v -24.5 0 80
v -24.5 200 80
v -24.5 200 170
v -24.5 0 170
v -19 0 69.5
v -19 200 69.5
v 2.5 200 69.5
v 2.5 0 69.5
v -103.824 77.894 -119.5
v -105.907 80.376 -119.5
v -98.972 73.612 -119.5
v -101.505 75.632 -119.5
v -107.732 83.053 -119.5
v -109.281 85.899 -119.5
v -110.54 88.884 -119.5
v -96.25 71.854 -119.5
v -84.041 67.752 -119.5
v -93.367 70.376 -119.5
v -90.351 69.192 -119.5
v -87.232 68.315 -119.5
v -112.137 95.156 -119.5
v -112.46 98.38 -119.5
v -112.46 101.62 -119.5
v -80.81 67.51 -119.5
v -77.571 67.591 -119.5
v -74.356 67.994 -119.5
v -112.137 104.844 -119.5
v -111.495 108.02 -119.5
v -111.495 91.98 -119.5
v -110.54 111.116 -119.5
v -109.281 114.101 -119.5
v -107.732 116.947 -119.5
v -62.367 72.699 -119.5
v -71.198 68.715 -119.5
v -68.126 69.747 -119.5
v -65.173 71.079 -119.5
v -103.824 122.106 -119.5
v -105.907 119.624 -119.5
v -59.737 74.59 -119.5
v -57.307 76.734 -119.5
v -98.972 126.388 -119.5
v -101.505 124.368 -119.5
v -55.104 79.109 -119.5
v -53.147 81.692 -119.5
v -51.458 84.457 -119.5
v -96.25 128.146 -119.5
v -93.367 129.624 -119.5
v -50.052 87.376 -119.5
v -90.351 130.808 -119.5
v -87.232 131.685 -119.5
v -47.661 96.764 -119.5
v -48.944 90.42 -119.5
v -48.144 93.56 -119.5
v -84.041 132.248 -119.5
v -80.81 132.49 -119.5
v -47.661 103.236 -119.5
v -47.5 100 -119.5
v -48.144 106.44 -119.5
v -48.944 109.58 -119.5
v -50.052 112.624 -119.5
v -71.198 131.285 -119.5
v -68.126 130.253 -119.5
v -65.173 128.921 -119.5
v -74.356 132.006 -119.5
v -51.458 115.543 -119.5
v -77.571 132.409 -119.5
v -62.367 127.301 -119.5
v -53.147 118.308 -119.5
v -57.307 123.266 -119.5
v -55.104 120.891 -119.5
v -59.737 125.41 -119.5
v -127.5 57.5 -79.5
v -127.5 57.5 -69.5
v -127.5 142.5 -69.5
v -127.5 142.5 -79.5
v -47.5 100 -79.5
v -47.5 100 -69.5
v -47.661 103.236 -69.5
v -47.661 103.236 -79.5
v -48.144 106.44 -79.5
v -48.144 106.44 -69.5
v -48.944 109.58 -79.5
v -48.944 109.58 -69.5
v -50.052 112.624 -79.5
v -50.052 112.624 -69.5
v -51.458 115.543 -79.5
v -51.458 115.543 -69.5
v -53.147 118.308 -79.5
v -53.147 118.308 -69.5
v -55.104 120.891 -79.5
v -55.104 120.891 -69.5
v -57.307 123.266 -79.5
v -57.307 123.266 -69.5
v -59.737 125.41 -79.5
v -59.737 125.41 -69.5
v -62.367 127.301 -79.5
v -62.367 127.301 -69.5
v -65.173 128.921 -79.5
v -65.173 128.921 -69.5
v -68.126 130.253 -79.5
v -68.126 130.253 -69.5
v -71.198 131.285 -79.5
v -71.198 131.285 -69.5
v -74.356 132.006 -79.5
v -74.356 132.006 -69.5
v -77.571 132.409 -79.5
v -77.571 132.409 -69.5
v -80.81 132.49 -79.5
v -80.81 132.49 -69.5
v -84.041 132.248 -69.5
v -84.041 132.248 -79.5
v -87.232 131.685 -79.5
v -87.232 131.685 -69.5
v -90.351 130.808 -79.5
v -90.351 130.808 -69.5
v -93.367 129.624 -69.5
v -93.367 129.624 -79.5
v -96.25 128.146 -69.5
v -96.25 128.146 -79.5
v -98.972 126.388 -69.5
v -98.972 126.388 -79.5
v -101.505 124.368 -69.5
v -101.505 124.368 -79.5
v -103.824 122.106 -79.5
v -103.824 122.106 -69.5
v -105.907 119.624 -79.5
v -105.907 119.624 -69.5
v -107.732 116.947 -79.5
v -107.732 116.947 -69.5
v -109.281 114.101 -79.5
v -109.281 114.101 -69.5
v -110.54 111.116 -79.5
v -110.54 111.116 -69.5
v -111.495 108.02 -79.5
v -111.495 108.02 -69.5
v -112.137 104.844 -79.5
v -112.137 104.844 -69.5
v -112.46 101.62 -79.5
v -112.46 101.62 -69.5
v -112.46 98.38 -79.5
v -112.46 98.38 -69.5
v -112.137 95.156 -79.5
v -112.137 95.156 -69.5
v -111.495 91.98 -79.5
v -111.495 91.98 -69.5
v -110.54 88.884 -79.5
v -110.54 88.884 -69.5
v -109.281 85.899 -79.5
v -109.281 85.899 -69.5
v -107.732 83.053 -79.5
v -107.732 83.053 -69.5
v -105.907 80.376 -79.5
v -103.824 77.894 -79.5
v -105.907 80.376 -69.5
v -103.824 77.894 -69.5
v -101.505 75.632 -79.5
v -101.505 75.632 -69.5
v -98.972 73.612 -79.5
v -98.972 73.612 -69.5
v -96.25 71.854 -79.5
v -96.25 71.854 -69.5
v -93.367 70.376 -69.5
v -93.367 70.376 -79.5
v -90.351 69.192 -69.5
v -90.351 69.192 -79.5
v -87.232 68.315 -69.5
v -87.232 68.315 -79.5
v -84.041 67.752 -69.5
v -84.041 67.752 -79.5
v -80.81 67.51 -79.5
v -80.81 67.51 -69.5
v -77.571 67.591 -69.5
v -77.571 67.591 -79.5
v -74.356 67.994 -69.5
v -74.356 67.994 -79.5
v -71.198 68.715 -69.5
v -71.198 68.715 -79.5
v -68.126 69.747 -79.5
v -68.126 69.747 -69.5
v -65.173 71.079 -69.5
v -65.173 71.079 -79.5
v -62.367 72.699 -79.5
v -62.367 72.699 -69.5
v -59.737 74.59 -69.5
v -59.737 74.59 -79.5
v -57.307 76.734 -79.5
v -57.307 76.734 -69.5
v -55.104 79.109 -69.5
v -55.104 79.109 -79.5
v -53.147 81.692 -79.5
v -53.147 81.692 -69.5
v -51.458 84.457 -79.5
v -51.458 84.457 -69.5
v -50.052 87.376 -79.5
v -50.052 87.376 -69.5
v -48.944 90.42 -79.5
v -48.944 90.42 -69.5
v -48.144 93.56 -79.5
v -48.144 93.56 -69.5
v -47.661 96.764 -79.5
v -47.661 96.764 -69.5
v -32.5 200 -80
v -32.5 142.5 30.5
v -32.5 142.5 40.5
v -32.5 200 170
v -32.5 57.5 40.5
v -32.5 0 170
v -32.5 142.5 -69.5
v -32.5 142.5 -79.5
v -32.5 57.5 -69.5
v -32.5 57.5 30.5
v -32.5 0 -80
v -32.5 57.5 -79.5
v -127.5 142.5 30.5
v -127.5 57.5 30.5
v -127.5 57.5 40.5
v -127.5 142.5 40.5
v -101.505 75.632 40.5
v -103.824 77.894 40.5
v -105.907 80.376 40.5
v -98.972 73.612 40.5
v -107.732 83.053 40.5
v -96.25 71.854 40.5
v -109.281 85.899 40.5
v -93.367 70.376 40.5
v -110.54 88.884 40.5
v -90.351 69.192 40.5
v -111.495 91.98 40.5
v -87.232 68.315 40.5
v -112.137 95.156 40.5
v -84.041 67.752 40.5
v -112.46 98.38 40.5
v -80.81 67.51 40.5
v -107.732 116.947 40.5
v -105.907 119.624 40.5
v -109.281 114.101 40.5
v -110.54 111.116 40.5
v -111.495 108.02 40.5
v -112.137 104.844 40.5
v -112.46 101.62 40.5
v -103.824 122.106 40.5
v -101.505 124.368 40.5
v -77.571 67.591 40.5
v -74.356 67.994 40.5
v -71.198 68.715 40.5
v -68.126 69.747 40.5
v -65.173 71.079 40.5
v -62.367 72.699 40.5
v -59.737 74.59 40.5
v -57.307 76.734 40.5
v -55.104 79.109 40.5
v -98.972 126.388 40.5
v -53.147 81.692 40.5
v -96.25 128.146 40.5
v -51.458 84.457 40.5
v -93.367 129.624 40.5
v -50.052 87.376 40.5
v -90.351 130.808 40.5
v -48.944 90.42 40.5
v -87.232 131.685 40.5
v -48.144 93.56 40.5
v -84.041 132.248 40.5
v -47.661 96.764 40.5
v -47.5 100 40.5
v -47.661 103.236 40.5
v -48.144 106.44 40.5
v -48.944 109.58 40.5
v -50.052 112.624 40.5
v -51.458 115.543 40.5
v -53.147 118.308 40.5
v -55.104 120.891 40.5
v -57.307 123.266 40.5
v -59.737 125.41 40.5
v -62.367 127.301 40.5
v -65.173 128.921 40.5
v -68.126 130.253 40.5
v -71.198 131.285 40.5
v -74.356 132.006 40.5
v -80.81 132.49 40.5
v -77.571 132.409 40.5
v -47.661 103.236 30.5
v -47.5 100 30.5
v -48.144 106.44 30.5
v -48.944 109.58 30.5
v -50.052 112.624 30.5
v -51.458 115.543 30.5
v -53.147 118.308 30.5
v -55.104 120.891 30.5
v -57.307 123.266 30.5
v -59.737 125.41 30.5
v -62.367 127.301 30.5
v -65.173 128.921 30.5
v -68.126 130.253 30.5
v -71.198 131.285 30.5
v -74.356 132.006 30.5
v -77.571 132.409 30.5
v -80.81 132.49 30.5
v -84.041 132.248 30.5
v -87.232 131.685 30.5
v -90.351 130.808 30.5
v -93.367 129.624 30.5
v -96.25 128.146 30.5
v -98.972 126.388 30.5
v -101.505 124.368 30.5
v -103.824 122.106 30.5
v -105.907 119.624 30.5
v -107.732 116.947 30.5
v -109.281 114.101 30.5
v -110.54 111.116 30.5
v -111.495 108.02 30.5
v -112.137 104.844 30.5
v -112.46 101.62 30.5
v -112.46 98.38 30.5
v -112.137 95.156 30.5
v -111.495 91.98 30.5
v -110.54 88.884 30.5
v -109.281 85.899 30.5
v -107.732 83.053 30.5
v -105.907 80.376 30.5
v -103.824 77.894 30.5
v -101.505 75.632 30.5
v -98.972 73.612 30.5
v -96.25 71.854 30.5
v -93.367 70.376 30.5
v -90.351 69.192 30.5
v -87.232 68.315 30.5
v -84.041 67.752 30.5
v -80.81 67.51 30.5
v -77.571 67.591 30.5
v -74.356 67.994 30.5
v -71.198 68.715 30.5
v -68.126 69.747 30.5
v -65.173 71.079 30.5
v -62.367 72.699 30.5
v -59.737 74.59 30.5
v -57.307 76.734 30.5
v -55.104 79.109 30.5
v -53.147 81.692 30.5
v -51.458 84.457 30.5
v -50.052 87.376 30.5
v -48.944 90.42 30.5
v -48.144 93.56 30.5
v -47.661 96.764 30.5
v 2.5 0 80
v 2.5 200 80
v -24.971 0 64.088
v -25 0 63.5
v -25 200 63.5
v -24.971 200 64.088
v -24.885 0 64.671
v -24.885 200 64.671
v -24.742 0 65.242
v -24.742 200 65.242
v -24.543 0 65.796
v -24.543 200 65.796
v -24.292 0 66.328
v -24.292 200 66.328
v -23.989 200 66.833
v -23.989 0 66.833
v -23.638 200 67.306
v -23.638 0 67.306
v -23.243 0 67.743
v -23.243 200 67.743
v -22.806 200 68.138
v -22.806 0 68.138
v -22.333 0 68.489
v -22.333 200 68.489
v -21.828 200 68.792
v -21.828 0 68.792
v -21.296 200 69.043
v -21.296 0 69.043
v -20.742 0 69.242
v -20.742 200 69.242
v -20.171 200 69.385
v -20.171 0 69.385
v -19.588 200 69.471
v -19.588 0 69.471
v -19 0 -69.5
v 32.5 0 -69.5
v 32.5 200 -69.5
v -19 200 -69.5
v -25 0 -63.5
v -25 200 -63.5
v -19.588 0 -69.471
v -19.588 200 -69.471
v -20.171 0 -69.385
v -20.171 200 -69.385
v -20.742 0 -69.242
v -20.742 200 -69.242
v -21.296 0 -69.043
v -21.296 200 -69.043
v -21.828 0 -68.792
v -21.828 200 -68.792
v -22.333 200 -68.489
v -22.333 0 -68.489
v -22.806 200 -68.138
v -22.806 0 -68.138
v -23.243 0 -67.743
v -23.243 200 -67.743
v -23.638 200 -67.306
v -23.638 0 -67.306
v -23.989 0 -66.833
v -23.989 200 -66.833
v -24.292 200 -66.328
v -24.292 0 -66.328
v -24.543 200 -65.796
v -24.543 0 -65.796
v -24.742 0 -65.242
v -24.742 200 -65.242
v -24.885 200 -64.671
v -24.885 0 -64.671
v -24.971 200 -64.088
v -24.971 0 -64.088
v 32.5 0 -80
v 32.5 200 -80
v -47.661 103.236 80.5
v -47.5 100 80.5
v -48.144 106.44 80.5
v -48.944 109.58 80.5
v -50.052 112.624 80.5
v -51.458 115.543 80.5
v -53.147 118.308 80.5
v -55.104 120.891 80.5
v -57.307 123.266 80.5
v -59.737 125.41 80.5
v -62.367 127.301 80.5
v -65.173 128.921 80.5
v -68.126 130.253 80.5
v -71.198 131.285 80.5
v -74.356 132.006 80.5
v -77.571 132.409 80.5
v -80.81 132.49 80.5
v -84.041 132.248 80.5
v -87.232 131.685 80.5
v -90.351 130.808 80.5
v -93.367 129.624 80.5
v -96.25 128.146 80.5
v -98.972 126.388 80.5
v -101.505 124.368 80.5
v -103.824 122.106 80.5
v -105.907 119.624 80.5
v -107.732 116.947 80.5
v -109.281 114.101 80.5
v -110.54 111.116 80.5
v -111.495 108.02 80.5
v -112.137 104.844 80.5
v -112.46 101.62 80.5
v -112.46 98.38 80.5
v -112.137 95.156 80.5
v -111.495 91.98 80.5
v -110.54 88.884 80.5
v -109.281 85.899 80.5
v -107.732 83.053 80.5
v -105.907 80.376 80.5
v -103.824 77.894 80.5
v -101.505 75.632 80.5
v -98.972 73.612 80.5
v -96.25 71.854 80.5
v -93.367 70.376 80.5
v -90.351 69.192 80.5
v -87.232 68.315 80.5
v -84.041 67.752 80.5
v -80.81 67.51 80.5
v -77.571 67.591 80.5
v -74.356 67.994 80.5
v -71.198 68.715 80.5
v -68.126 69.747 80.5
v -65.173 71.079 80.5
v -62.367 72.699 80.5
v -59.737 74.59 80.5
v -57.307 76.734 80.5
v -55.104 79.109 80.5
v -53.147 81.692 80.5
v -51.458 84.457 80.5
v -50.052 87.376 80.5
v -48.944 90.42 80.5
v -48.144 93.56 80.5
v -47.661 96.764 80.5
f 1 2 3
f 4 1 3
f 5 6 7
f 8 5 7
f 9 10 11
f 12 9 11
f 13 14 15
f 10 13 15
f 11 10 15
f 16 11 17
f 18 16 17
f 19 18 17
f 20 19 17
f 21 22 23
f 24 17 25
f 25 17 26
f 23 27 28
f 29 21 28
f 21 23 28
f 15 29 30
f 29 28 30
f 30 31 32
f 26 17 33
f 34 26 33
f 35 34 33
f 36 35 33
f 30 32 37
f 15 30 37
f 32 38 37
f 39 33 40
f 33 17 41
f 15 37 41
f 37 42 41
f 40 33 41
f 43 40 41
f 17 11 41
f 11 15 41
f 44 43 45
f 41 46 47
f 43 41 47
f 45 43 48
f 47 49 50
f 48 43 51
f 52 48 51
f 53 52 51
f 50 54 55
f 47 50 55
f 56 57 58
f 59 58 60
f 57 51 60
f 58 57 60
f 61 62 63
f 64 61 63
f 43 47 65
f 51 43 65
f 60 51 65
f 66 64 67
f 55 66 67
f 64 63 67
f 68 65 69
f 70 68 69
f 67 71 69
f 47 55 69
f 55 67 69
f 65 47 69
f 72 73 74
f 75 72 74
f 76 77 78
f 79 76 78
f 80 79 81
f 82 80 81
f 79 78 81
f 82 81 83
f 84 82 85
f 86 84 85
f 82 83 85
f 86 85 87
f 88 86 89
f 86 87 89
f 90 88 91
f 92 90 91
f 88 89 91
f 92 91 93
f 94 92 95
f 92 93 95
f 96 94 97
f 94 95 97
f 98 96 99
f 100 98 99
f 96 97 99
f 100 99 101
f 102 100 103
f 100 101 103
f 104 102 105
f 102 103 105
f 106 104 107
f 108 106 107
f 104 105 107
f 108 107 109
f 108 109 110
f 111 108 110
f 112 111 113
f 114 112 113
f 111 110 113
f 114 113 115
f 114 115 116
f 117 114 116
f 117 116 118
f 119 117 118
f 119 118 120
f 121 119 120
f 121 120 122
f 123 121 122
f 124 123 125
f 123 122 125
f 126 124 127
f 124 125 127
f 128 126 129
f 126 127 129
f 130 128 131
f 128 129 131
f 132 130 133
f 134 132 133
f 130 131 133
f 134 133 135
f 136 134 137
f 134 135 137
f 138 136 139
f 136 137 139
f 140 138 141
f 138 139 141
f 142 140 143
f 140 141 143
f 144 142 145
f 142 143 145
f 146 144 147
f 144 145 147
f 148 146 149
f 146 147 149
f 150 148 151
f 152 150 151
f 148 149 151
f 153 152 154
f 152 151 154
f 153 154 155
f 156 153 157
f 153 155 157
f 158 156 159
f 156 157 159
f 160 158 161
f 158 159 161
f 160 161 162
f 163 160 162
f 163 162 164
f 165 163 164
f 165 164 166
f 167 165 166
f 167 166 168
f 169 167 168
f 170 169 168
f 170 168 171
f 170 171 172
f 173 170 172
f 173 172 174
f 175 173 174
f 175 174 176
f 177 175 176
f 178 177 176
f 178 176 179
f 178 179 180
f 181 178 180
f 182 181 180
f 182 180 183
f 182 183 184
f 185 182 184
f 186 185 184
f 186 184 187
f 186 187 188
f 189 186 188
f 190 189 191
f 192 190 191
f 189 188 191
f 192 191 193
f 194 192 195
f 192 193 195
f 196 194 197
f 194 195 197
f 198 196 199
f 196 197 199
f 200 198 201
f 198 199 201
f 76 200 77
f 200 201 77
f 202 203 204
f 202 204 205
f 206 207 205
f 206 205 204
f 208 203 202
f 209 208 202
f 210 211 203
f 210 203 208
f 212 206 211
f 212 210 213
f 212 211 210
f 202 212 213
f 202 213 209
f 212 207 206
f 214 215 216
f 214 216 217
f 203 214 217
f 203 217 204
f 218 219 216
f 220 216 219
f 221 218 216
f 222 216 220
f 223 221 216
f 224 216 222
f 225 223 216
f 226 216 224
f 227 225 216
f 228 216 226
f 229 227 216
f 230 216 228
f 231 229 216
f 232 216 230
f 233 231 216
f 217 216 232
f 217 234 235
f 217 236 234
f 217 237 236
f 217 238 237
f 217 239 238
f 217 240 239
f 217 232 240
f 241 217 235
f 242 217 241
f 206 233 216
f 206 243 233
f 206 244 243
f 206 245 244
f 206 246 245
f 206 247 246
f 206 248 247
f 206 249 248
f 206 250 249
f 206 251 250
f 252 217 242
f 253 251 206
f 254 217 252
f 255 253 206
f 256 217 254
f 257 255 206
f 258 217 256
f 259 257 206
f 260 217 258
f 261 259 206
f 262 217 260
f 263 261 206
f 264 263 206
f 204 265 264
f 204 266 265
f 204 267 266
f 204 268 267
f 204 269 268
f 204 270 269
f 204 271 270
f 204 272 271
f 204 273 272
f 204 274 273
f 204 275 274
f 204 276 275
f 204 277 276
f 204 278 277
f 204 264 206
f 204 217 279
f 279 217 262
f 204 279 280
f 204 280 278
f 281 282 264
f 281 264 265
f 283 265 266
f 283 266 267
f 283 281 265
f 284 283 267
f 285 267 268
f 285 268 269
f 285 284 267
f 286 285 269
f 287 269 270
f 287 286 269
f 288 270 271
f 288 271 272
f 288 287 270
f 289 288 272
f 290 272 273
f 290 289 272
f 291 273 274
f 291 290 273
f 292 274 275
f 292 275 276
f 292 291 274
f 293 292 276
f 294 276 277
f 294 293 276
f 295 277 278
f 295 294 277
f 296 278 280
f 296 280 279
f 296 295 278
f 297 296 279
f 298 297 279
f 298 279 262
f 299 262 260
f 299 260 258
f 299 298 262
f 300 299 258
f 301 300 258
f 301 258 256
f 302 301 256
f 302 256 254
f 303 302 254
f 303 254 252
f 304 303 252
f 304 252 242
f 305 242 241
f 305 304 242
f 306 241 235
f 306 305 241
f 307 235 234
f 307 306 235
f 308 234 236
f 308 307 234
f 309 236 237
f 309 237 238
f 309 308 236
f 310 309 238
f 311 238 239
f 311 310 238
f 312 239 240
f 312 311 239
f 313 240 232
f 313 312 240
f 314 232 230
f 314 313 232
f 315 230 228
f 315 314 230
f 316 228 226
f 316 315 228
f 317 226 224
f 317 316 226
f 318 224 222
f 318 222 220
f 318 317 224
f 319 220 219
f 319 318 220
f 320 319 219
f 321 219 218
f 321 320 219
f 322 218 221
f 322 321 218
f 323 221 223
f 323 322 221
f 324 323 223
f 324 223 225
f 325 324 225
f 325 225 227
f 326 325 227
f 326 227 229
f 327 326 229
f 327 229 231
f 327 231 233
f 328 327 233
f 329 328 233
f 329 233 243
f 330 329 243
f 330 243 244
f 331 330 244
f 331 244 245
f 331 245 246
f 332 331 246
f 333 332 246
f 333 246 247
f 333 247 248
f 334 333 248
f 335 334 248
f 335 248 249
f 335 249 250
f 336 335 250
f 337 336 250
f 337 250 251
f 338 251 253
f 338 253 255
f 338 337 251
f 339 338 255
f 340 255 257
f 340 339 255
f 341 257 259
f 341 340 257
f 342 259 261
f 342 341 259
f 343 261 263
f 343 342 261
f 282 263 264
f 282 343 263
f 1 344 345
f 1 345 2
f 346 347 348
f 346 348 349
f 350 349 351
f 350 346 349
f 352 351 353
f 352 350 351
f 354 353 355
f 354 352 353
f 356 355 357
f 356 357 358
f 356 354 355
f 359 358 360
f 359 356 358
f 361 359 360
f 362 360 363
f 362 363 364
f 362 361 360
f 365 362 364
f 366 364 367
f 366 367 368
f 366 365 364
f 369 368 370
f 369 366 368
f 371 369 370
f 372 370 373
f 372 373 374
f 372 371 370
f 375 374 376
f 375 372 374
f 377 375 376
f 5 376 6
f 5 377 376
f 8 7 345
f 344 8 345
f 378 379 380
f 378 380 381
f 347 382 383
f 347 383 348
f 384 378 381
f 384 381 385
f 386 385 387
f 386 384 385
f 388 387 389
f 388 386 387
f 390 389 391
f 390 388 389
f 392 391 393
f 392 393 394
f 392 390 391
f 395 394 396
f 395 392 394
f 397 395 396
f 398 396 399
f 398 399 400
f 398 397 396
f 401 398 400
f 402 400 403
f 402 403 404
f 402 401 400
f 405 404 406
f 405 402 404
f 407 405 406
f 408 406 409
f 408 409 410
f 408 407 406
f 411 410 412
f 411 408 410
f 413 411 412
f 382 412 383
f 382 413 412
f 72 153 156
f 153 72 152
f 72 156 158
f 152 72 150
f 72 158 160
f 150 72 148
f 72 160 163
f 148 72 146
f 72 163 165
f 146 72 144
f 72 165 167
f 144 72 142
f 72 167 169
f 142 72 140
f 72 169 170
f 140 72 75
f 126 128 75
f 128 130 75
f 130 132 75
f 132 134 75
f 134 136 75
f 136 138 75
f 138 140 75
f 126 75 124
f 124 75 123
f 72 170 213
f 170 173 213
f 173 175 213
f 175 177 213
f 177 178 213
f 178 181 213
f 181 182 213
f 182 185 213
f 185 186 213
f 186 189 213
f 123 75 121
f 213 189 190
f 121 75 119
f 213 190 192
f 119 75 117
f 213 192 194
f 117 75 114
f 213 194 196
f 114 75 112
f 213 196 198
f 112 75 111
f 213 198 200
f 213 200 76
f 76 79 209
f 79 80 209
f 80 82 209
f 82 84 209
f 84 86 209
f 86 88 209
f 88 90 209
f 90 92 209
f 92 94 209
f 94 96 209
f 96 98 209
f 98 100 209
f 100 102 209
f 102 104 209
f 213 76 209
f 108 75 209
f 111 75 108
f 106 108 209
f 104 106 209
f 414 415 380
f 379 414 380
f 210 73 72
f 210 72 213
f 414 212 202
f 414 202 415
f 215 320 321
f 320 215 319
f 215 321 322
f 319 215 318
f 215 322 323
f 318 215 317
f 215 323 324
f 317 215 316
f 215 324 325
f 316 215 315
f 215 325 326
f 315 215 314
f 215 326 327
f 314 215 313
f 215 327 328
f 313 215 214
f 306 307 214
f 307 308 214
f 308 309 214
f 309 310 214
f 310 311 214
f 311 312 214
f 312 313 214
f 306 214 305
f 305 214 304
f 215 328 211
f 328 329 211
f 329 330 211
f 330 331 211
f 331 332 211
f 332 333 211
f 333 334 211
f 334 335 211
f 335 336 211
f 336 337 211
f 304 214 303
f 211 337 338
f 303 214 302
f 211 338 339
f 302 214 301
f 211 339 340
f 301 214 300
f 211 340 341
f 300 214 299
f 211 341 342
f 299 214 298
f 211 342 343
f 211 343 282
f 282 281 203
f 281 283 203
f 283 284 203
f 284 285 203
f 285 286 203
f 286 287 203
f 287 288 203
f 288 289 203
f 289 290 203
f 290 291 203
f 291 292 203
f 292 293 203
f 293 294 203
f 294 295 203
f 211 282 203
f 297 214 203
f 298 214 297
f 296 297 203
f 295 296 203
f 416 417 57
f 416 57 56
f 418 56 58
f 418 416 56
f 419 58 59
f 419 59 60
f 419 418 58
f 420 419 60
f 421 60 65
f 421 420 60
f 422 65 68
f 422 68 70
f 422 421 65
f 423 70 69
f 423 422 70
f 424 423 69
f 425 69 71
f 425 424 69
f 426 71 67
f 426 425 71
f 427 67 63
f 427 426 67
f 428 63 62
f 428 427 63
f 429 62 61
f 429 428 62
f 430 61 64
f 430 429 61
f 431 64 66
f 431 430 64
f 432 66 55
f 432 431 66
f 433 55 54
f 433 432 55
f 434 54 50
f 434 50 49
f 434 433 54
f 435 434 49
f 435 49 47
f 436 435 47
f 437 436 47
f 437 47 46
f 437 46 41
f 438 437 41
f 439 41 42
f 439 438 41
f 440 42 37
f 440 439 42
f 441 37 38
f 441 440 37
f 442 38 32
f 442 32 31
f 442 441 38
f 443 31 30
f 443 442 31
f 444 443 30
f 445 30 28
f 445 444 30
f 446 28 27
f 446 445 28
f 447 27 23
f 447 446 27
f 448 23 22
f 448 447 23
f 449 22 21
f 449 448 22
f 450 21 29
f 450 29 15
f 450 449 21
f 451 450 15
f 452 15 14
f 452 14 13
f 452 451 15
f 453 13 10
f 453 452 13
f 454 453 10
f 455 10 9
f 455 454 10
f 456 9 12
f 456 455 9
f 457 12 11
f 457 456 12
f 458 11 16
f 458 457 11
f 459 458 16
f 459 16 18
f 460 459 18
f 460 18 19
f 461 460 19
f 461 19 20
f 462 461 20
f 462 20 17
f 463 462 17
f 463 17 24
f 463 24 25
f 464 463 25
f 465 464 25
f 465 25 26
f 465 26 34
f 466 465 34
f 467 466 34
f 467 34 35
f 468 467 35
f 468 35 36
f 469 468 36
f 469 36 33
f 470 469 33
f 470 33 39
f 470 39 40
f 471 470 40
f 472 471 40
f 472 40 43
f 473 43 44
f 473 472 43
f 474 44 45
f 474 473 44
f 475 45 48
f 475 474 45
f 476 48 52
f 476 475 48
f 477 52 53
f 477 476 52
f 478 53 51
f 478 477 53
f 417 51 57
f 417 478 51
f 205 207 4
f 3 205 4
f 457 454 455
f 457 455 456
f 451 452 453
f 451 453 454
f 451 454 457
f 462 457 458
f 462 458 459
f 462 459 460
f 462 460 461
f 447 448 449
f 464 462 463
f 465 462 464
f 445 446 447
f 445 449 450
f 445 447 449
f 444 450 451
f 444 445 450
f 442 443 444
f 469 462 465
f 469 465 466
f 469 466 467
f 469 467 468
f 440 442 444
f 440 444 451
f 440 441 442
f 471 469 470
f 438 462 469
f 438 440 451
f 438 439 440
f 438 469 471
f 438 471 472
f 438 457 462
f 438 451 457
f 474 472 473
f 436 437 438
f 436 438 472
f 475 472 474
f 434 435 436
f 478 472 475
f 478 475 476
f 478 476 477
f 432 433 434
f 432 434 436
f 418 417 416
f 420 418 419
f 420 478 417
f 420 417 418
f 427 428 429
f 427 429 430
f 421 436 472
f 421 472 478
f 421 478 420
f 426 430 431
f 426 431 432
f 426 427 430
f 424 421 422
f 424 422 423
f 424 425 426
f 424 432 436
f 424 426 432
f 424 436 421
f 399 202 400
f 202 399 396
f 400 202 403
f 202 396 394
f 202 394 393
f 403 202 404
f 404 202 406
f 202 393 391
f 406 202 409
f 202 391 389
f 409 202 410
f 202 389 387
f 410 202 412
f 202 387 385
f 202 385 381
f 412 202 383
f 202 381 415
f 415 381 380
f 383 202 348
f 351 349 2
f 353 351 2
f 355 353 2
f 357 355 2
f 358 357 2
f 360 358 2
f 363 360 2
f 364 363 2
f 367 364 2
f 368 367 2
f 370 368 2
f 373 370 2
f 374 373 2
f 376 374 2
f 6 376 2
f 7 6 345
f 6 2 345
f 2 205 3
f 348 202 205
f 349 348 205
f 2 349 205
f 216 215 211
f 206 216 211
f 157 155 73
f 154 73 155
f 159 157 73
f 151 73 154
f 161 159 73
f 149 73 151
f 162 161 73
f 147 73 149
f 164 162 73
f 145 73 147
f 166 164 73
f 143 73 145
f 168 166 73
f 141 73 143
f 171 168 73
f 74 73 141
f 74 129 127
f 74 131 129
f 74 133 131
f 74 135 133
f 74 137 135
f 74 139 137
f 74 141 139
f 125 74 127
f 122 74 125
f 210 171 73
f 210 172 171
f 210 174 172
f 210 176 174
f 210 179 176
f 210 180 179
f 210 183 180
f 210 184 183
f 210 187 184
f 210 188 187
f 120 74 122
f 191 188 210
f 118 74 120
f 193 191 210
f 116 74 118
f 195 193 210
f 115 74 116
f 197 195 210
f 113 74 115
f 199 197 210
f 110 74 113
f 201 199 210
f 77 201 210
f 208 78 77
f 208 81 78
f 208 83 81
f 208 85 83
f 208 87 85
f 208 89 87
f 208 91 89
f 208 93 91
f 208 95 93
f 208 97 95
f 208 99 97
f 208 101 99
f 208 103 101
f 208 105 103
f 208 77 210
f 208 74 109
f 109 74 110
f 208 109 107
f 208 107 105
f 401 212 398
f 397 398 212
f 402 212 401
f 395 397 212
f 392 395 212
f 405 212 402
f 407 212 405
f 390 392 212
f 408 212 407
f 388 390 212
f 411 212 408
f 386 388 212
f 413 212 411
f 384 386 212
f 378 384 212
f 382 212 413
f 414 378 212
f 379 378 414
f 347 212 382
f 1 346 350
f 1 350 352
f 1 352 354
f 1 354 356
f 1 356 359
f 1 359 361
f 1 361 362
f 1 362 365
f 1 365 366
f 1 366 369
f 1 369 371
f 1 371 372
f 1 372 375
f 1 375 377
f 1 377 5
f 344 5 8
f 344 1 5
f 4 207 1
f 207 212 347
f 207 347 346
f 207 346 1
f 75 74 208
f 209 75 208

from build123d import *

# Parameters (mm, degrees)
F0_W      = 8
F0_H      = 90
F1_DEPTH  = 200
F3_W      = 95
F3_H      = 85
F3_R      = 32.5
F4_DEPTH  = 10
F6_W      = 95
F6_H      = 85
F6_R      = 32.5
F7_DEPTH  = 10
F9_R      = 32.5
F10_DEPTH = 200


with BuildPart() as f1:
    # F0 (on Front) → F1 (new body)
    with BuildSketch(Plane.XZ):
        with BuildLine():
            Line((2.5, 69.5), (2.5, 80))
            Line((2.5, 80), (-24.5, 80))
            Line((-24.5, 80), (-32.5, 80))
            Line((-32.5, 80), (-32.5, -80))
            Line((-32.5, -80), (32.5, -80))
            Line((32.5, -80), (32.5, -69.5))
            Line((32.5, -69.5), (-19, -69.5))
            ThreePointArc((-19, -69.5), (-23.2426406871, -67.7426406871), (-25, -63.5))
            Line((-25, -63.5), (-25, 63.5))
            ThreePointArc((-25, 63.5), (-23.2426406871, 67.7426406871), (-19, 69.5))
            Line((-19, 69.5), (2.5, 69.5))
        make_face()
        with Locations((-28.5, 125)):
            Rectangle(F0_W, F0_H)
    extrude(amount=-F1_DEPTH)

    # F3 (on offset) → F4 (join)
    with BuildSketch(Plane.XY.offset(-69.5)):
        with Locations((-80, 100)):
            Rectangle(F3_W, F3_H)
        with Locations((-80, 100)):
            Circle(F3_R, mode=Mode.SUBTRACT)
    extrude(amount=-F4_DEPTH)

    # F6 (on offset) → F7 (join)
    with BuildSketch(Plane.XY.offset(30.5)):
        with Locations((-80, 100)):
            Rectangle(F6_W, F6_H)
        with Locations((-80, 100)):
            Circle(F6_R, mode=Mode.SUBTRACT)
    extrude(amount=F7_DEPTH)


with BuildPart() as f10:
    # F9 (on offset) → F10 (new body)
    with BuildSketch(Plane.XY.offset(80.5)):
        with Locations((-80, 100)):
            Circle(F9_R)
    extrude(amount=-F10_DEPTH)


solid = Compound([f1.part, f10.part])
